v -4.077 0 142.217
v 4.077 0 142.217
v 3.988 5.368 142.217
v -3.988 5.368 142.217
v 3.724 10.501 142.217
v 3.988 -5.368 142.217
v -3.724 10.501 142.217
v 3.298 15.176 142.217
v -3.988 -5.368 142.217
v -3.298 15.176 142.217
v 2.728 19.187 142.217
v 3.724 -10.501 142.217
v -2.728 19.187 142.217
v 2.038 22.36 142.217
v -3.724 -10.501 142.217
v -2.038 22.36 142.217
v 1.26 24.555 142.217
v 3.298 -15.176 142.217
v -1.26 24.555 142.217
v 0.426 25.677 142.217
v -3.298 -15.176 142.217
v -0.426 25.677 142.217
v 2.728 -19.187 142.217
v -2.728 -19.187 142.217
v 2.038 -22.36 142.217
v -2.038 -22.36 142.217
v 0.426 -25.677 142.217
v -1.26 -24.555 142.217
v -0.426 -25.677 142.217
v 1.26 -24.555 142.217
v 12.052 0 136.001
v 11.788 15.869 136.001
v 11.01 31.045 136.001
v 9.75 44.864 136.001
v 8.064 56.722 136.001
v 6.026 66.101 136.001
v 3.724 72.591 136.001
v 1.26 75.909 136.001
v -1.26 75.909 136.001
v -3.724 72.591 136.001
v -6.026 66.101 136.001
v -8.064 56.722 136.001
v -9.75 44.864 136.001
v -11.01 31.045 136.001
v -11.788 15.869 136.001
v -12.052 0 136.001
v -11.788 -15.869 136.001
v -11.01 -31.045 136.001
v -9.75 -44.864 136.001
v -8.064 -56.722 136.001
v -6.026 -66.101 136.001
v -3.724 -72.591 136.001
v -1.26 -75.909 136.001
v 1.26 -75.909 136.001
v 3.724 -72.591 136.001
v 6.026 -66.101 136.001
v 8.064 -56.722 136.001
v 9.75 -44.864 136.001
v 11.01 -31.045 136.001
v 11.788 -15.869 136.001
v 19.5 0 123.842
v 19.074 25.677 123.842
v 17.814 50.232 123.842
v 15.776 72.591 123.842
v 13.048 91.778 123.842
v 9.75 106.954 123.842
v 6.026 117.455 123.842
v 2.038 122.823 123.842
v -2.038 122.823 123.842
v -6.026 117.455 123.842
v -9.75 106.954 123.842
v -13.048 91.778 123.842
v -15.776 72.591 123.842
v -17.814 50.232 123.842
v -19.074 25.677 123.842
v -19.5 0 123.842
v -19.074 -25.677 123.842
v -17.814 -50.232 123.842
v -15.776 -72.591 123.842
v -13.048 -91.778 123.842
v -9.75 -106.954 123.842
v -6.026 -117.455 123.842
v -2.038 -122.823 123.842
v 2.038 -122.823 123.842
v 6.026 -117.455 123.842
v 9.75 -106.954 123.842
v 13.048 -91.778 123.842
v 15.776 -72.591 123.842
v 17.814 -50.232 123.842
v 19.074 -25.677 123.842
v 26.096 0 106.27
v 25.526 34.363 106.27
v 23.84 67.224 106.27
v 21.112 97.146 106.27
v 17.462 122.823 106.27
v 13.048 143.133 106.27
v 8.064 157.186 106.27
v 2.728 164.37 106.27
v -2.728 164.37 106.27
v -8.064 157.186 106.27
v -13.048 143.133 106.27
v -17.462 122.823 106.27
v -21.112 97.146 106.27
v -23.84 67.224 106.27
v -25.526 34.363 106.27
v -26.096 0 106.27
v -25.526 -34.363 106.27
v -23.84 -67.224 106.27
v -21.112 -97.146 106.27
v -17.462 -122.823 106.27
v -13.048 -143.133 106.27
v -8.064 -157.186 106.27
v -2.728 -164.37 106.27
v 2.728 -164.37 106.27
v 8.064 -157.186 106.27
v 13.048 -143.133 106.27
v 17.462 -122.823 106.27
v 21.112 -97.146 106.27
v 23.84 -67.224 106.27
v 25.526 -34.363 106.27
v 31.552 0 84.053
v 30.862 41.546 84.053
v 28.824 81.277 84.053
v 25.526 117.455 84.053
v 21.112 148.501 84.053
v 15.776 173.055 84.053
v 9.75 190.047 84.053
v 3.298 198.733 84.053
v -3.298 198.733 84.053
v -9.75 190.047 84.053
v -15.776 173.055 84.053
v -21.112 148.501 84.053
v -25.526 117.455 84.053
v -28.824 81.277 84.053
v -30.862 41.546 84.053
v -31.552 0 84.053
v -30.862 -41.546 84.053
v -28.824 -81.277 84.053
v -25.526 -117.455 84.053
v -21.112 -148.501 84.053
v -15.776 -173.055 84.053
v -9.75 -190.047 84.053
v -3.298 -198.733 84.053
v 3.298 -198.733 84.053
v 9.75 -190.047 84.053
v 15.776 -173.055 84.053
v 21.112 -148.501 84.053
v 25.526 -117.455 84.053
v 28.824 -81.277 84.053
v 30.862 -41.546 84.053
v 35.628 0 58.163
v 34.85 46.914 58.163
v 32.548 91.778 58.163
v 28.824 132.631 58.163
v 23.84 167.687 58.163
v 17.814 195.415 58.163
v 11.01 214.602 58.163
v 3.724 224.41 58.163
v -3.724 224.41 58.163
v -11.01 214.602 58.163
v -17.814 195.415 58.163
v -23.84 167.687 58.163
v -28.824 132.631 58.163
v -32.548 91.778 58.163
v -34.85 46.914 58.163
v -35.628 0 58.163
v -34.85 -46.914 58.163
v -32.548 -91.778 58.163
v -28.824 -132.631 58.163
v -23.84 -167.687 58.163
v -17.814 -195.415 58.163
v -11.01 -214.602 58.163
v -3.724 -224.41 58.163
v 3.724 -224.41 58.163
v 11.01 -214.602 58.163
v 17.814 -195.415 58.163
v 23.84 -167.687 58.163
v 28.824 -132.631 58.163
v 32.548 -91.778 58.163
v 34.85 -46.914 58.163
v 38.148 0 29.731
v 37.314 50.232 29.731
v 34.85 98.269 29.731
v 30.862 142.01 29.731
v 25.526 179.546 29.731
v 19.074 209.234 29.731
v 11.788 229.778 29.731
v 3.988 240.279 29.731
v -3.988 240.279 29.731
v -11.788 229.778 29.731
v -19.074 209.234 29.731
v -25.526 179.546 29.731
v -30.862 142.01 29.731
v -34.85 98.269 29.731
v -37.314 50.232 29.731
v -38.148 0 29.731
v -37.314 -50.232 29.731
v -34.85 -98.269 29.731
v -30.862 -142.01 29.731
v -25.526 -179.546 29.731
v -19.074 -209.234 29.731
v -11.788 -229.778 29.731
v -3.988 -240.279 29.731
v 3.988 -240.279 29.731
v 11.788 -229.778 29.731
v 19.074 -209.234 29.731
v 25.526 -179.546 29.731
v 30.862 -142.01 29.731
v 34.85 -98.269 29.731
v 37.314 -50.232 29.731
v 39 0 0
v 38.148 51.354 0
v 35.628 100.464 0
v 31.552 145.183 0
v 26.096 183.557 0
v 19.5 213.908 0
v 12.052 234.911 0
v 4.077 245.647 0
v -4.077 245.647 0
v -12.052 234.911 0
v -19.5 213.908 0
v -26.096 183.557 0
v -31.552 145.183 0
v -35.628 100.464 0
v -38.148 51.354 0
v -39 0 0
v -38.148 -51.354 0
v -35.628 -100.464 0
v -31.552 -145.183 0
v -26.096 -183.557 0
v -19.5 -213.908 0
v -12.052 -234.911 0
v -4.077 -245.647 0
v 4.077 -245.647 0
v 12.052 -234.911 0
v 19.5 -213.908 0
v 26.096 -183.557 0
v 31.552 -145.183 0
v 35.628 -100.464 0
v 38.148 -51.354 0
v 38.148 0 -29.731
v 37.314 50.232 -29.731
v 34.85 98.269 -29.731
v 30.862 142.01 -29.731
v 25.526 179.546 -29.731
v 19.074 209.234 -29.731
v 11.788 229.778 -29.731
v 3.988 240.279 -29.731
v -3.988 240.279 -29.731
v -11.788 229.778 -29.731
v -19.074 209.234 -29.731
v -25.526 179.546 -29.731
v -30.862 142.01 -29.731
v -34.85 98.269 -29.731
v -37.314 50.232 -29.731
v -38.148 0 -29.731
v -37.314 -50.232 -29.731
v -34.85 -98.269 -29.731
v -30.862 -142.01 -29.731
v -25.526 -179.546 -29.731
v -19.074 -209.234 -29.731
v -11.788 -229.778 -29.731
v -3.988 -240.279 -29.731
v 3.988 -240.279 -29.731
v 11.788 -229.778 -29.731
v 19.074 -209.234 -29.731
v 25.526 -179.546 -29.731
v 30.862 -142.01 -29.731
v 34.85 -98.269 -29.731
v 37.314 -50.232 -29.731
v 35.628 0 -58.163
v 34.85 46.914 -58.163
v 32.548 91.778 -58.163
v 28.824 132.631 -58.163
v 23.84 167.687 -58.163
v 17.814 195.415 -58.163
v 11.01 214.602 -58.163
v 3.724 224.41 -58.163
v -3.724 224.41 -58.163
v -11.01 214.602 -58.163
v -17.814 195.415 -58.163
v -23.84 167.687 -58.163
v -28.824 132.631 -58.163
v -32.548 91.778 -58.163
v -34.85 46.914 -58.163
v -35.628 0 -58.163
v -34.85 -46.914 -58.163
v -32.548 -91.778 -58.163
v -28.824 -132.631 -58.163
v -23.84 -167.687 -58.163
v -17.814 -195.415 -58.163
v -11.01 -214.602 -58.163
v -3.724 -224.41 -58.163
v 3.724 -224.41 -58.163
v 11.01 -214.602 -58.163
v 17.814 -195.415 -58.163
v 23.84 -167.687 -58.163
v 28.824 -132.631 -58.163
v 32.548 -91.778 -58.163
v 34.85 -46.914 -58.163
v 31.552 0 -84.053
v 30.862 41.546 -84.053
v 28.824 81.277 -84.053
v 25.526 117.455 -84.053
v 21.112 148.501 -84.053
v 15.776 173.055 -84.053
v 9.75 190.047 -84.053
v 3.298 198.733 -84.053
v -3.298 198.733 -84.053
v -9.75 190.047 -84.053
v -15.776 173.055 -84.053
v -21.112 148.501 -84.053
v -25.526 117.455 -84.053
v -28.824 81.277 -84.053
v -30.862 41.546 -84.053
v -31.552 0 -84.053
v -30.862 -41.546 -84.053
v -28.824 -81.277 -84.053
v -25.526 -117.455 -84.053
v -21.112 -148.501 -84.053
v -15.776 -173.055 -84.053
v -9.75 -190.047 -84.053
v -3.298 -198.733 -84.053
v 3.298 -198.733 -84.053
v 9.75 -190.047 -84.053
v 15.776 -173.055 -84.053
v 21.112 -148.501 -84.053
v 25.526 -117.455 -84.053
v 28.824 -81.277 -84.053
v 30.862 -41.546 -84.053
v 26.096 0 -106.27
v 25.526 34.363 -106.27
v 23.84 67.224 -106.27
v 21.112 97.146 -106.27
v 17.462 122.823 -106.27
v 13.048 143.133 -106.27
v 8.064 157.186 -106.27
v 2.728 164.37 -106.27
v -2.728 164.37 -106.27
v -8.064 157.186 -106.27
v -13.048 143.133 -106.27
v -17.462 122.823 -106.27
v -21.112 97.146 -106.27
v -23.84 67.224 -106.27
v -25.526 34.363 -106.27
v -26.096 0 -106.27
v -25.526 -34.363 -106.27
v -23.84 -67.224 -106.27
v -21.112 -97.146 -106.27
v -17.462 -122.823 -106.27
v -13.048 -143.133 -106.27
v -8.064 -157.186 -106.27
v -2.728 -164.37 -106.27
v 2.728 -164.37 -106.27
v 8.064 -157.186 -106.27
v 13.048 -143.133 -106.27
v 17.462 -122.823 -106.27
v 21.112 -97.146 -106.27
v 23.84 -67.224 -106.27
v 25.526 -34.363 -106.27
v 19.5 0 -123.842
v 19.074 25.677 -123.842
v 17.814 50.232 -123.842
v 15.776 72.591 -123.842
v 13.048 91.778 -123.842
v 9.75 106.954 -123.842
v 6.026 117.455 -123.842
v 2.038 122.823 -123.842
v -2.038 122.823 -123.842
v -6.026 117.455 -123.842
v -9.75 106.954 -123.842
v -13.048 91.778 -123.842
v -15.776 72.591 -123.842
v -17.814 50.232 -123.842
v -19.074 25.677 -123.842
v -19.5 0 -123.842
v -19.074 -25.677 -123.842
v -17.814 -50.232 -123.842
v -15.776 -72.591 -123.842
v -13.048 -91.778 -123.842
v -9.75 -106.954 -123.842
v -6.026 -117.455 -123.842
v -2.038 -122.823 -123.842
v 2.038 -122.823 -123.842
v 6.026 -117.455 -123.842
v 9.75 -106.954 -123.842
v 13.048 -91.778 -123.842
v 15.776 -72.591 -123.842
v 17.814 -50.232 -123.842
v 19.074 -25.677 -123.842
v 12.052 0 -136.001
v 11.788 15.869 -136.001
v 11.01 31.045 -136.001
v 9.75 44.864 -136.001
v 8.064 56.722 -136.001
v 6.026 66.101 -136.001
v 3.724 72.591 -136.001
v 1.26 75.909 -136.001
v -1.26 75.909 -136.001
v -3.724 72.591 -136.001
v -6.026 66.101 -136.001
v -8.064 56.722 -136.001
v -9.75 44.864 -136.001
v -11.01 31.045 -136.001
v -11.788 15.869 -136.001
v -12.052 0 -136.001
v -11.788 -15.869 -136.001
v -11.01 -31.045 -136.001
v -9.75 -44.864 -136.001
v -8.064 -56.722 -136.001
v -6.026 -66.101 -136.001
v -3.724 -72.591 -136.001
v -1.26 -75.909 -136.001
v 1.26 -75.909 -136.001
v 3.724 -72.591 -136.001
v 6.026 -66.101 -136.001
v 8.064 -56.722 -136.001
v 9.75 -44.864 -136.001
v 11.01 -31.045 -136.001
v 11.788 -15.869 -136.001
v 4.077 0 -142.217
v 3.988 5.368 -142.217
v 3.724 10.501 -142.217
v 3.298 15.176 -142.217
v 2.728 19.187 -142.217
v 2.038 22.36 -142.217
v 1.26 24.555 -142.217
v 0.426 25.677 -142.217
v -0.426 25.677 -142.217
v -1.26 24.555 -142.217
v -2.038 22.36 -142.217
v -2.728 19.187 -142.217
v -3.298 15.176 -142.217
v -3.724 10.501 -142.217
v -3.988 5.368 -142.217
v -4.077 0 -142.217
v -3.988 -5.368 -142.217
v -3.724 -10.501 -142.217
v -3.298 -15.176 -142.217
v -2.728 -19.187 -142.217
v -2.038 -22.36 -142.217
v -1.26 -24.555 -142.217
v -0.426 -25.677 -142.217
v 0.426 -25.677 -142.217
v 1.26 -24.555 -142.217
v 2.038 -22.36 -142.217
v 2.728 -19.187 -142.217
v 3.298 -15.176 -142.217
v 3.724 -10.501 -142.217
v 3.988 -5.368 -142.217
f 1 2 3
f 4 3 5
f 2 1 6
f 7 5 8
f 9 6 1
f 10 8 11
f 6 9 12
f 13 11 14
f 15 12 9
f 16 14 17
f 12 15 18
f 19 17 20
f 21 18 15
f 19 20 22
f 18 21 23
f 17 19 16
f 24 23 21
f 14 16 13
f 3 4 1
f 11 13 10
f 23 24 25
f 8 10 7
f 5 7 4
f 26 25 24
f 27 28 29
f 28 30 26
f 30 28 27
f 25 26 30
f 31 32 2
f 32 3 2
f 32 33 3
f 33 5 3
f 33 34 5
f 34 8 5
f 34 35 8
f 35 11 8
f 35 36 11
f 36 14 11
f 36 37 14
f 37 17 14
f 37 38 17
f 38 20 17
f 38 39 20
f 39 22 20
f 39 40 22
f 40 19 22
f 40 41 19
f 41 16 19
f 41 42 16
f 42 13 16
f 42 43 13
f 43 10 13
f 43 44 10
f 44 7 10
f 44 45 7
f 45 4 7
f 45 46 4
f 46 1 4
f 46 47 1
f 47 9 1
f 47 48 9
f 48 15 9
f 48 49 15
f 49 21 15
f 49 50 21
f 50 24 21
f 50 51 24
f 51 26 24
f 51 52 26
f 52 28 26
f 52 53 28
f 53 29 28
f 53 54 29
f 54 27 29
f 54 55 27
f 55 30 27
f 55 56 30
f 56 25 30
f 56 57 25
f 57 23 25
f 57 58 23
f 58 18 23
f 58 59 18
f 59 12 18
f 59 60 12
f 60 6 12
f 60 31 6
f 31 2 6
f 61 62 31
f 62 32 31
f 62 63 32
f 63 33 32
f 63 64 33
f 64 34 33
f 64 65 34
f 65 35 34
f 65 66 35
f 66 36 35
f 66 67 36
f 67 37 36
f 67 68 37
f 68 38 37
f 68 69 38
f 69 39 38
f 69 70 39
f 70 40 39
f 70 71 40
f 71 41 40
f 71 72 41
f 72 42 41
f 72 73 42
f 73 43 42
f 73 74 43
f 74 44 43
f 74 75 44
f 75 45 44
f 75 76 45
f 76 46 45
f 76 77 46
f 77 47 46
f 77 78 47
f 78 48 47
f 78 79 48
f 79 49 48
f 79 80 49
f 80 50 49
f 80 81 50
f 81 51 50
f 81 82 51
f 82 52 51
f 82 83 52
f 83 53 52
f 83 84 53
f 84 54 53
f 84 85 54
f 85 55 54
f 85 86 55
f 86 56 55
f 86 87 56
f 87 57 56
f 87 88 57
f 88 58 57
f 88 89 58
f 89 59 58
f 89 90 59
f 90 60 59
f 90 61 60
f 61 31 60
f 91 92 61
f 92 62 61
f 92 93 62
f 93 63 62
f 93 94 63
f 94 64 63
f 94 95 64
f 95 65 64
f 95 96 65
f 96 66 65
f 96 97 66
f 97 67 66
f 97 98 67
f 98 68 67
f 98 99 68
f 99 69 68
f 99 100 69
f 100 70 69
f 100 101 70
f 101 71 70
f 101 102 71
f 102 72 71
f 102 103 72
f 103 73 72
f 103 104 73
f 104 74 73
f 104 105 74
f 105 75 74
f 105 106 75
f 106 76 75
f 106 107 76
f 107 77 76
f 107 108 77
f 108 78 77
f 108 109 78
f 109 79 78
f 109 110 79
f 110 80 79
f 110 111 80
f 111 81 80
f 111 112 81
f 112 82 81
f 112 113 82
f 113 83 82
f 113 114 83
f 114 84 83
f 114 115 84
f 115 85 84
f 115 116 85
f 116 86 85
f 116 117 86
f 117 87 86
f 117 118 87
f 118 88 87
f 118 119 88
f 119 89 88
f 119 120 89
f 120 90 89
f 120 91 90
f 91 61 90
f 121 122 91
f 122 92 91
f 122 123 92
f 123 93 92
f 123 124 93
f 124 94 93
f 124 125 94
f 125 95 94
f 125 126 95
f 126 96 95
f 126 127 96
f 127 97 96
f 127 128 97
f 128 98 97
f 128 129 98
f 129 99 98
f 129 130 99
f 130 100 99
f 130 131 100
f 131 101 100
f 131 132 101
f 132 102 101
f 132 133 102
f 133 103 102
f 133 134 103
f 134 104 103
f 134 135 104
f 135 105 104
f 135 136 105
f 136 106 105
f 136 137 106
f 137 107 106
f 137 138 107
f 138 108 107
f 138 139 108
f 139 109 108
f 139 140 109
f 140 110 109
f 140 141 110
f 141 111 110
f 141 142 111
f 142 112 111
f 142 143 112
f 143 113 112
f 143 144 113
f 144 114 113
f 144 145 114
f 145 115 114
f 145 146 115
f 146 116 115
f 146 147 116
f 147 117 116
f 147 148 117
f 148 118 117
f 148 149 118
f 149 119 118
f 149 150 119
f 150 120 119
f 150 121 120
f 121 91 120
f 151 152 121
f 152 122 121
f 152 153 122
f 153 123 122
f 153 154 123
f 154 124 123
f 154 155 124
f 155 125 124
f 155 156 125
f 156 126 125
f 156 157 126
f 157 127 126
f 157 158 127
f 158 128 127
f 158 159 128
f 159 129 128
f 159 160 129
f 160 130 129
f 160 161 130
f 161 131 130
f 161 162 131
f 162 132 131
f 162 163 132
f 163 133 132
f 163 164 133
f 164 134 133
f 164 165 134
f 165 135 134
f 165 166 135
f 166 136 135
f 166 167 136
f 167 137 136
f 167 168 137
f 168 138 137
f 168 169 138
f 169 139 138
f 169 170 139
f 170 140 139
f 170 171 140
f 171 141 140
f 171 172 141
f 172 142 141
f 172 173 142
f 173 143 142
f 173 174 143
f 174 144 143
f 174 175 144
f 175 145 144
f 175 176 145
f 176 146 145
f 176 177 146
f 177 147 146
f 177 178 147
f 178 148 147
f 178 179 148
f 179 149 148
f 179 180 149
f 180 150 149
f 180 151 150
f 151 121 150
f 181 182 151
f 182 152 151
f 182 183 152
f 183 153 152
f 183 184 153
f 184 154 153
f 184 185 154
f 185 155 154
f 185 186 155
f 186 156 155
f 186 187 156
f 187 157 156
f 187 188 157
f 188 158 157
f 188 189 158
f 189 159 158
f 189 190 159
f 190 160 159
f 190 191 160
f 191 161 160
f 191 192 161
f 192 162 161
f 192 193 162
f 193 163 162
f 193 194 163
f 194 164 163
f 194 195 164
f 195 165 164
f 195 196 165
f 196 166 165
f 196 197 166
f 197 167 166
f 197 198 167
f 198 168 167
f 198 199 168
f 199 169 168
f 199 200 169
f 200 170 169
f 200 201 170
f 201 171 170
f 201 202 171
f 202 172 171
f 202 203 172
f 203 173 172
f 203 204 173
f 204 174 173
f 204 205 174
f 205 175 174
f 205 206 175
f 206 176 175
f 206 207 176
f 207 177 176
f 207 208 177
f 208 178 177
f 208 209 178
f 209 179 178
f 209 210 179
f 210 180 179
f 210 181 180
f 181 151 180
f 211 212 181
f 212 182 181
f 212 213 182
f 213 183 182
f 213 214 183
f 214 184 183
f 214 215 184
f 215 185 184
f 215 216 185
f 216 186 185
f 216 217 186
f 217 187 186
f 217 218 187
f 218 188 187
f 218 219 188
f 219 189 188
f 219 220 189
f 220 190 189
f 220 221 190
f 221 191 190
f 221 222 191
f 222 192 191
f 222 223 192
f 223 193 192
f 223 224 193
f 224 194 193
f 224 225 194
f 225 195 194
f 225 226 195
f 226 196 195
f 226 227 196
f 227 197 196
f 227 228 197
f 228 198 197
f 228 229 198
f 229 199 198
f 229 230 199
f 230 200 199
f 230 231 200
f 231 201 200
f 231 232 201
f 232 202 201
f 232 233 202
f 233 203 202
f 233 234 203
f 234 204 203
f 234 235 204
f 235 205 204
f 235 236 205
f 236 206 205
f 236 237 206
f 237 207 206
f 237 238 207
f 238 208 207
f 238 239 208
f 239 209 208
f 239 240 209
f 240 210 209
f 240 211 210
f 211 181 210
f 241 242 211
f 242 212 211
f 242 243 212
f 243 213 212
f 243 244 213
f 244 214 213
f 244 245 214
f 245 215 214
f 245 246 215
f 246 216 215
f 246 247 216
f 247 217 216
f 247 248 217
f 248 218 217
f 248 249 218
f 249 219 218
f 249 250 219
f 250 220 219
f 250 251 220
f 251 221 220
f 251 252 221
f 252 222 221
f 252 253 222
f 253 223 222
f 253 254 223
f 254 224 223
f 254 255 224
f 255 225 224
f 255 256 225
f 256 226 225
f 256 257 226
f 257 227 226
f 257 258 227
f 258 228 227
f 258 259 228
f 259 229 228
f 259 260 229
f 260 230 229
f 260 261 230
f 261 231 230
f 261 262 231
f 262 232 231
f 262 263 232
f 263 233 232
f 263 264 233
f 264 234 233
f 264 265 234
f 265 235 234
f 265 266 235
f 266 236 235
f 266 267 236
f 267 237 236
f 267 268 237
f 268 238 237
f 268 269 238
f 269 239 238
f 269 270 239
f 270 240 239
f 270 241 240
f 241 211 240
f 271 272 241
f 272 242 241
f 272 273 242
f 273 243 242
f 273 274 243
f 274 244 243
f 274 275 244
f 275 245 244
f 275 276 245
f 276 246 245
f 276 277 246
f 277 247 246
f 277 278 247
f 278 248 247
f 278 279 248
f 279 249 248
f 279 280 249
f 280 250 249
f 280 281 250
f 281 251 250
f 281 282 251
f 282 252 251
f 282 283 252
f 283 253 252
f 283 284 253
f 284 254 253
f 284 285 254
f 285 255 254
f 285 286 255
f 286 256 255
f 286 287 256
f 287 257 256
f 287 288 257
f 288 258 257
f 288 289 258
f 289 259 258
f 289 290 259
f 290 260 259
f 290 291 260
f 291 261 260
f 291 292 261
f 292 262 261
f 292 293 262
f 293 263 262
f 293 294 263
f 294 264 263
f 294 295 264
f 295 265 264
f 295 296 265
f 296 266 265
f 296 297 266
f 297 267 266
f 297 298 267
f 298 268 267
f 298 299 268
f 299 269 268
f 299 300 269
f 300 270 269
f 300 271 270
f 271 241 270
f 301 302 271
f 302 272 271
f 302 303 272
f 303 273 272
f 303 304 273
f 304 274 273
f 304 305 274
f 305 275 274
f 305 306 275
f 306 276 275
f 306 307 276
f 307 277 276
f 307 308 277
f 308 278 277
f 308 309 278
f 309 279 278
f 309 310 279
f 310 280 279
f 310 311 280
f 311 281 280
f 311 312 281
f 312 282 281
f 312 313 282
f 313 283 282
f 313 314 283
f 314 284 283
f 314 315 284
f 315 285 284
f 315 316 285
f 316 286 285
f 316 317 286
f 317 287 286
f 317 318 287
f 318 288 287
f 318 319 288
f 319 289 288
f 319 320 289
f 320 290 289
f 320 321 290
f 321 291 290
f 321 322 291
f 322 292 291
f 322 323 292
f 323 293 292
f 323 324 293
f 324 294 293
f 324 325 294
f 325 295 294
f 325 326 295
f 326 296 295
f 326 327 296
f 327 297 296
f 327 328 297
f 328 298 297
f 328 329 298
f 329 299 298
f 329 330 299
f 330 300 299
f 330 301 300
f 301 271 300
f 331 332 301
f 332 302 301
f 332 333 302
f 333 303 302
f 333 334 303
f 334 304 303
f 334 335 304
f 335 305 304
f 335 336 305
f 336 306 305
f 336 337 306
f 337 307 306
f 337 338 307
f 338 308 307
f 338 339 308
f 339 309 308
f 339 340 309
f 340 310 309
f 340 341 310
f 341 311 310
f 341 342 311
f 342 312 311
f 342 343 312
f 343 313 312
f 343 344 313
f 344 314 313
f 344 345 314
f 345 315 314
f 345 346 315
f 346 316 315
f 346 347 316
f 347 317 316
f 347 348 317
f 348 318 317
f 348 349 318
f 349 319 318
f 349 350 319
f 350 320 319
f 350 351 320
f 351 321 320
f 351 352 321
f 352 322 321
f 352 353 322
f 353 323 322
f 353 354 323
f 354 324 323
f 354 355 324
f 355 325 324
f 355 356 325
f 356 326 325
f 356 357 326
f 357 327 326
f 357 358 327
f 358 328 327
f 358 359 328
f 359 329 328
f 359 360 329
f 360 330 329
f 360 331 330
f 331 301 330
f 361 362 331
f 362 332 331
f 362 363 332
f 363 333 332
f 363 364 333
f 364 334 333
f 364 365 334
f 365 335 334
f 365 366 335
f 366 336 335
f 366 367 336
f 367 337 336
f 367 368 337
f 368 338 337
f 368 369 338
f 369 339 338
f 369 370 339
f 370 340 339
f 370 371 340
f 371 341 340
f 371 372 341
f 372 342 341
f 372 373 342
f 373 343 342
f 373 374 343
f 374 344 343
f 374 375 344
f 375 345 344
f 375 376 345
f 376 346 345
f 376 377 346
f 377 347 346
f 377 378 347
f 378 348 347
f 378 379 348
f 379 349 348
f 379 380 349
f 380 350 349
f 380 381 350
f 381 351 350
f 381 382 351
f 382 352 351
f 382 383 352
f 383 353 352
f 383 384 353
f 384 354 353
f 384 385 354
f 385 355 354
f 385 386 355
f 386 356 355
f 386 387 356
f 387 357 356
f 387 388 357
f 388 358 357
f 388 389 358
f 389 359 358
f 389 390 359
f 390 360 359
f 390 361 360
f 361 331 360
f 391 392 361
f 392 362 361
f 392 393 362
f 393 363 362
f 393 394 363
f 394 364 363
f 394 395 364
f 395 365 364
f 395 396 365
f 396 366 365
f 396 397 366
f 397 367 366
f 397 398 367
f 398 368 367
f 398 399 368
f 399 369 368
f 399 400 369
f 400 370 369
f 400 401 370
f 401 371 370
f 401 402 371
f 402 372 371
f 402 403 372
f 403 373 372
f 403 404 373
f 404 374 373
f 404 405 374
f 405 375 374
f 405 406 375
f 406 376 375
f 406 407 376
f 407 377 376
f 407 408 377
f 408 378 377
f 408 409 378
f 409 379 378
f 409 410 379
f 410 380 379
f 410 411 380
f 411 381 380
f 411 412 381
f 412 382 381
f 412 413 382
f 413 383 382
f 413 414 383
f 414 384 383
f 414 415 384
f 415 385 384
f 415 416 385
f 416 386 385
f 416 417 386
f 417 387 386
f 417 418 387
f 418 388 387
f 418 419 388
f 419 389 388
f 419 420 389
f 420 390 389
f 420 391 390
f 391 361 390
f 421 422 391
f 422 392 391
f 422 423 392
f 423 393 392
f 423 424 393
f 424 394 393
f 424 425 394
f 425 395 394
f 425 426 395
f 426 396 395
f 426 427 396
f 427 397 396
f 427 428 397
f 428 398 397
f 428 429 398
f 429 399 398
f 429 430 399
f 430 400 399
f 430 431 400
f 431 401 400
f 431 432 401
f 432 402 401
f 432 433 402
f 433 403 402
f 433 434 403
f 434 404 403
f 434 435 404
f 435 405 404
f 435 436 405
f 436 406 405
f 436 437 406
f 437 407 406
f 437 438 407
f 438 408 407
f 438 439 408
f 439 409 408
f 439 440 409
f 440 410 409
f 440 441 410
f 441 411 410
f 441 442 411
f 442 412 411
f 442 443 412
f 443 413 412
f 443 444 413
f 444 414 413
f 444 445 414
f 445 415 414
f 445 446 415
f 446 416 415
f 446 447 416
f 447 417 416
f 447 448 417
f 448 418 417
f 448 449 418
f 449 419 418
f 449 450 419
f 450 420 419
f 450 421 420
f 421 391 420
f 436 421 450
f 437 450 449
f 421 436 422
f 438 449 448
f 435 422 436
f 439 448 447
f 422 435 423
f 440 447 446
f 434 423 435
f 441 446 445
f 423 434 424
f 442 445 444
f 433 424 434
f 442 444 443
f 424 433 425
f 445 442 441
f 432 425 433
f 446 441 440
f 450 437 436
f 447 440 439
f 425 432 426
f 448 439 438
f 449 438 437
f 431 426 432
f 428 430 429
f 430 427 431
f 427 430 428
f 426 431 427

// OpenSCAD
// Generated by SolidPython 1.0.1 on 2020-07-29 00:46:46


scale(v = [3, 19, 11]) {
	sphere(r = 13);
}
/***********************************************
*********      SolidPython code:      **********
************************************************
 
# import packages: SolidPython
from solid import *
from solid.utils import *
from itertools import chain, combinations, permutations


class Resize:

    def __init__(self, scad_file):
        self.scad_file = scad_file
        #self.scad_file = import_scad(scad_file)
        # cone/cylinder param:
        self.r1 = 0
        self.r2 = 0
        self.h = 0
        # rectangular prism param:
        self.w = 0
        self.l = 0
        # ellipse param:
        self.r = 0

    # import OpenScad code (file name corresponds to shape)


    # classify shape + parameters
    def assign(self, param1, param2, param3):
        if self.scad_file == 'cone.scad':
            self.r1 = param1
            self.r2 = param2
            self.h = param3
        elif self.scad_file == 'cylinder.scad':
            self.r1 = param1
            self.r2 = param2
            self.h = param3
        elif self.scad_file == 'rectangularPrism.scad':
            self.h = param1
            self.l = param2
            self.w = param3
        else:
            self.r = param1
            self.h = param2

    # resize parameters
    def iterate(self):
        x = range(3, 20, 2)
        i = 1
        if self.scad_file == 'cone.scad':
            tempList = list(permutations(x, 2))
            for temp in tempList:
                param1 = temp[0]
                param2 = temp[1]
                filepath = 'produced_scad_files/' + 'cone' + str(param1) + '_' + str(param2) + '_' + '.scad'
                scad_render_to_file(cylinder(h=param1, r1=param2, r2=0), filepath)

        elif self.scad_file == 'cylinder.scad':
            tempList = list(permutations(x, 3))
            for temp in tempList:
                param1 = temp[0]
                param2 = temp[1]
                filepath = 'produced_scad_files/' + 'cylinder' + str(param1) + '_' + str(param2) + '_' + '.scad'
                scad_render_to_file(cylinder(h=param1, r1=param2, r2=param2), filepath)

        elif self.scad_file == 'rectangularPrism.scad':
            tempList = list(permutations(x, 3))
            for temp in tempList:
                param1 = temp[0]
                param2 = temp[1]
                param3 = temp[2]
                filepath = 'produced_scad_files/' + 'rectangularPrism' + str(param1) + '_' + str(param2) + '_' + str(
                    param3) + '.scad'
                scad_render_to_file(cube(size=(param1, param2, param3)), filepath)

        elif self.scad_file == 'ellipse.scad':
            tempList = list(permutations(x, 4))
            for temp in tempList:
                param1 = temp[0]
                param2 = temp[1]
                param3 = temp[2]
                param4 = temp[3]
                filepath = 'produced_scad_files/' + 'ellipse' + str(param1) + '_' + str(param2) + '_' + str(param3) + '_' + str(param4) + '.scad'
                scad_render_to_file(scale([param1, param2, param3])(sphere(r=param4)), filepath)

    def render_to_scadfile(self):
        scad_render_to_file(scad, 'example.scad') 
 
************************************************/
